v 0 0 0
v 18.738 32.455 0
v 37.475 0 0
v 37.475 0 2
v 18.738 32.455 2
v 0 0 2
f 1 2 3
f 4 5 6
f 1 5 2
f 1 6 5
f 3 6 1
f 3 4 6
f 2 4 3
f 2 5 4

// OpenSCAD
motor_diameter = 28;
motor_hole_dx = 16;
motor_hole_dy = 19;
//
propeller = 254;
motor_to_motor = 260;       //210 > bambu_p1s volume, propeller*1.5 = best
center_to_motor = motor_to_motor/1.414;

module arm_toseat(){
    //to motor
    difference(){
        union(){
        hull(){
        translate([-75,0,0])rotate([0, 90, 0])scale([0.8, 1, 1])cylinder(0.001, r=16, center=true,$fn=50);
        translate([-35,0,0])rotate([0, 90, 0])scale([2, 1, 1])cylinder(0.001, r=6, center=true,$fn=50);
        }
        hull(){
        translate([-75, 0, -20/2])cube([0.001, 32, 20],center=true);
        translate([-35, 0, -20/2])cube([0.001, 12, 20],center=true);
        }
        }
        //-upper
        hull(){
        translate([-75,0,0])rotate([0, 90, 0])scale([0.8, 1, 1])cylinder(0.001, r=15, center=true,$fn=50);
        translate([-35,0,0])rotate([0, 90, 0])scale([2, 1, 1])cylinder(0.001, r=5, center=true,$fn=50);
        }
        //-below
        hull(){
        translate([-75, 0, -20/2])cube([0.001, 30, 18],center=true);
        translate([-35, 0, -20/2])cube([0.001, 10, 18],center=true);
        }
        translate([-35-25/2, 0, -40/2])cube([25, 10, 20],center=true);
    }
}
module arm_center(){
    width=60;
    translate([-5,0,0])difference(){
        rotate([0, 90, 0])scale([2, 1, 1])cylinder(width, r=6, center=true,$fn=50);
        rotate([0, 90, 0])scale([2, 1, 1])cylinder(999, r=5, center=true,$fn=50);
        translate([0, 0, -80/2])cube([ 999, 80, 80],center=true);
    }
    difference(){
        translate([-5, 0, -20/2])cube([width, 12, 20],center=true);
        translate([-5, 0, 1-20/2])cube([999, 10, 20],center=true);
        //
        translate([-25+25/2, 0, -40/2])cube([25, 10, 20],center=true);
        //translate([ 25-10/2, 0, -40/2])cube([10, 10, 20],center=true);
    }
}
module arm_tobody(){
    difference(){
        union(){
        hull(){
        translate([ 65,0,0])rotate([0, 90, 0])scale([0.8, 1, 1])cylinder(0.001, r=16, center=true,$fn=50);
        translate([ 25,0,0])rotate([0, 90, 0])scale([2, 1, 1])cylinder(0.001, r=6, center=true,$fn=50);
        }
        hull(){
        translate([ 65, 0, -20/2])cube([0.001, 32, 20],center=true);
        translate([ 25, 0, -20/2])cube([0.001, 12, 20],center=true);
        }
        }

        hull(){
        translate([ 65,0,0])rotate([0, 90, 0])scale([0.8, 1, 1])cylinder(0.001, r=15, center=true,$fn=50);
        translate([ 25,0,0])rotate([0, 90, 0])scale([2, 1, 1])cylinder(0.001, r=5, center=true,$fn=50);
        }

        hull(){
        translate([ 75, 0, -20/2])cube([0.001, 30, 20],center=true);
        translate([ 25, 0, -20/2])cube([0.001, 10, 20],center=true);
        }

        translate([ 25+25/2, 0, -40/2])cube([25, 10, 20],center=true);
    }
}
module wing(){

    difference(){
        union(){
            //motor seat
            translate([0, 0, 5/2])cylinder(5, r=16, center=true,$fn=50);
            //curve
            translate([75, 0, 20])arm_toseat();
            translate([75, 0, 20])arm_center();
            translate([75, 0, 20])arm_tobody();
            //tobody
            //translate([150-10/2, 0, 32/2])rotate([0,90,0])cylinder(10, r=16, center=true,$fn=50);
            //translate([150-10/2, 0, 16/2])cube([10, 32, 16],center=true);
        }

        //motor area
        translate([0,0,5])rotate([0,20,0])translate([-20/2,0,20])cube([20, 99, 40],center=true);

        //-motor seat hole
        translate([0, 0, 3+20/2])cylinder(20, r=motor_diameter/2, center=true,$fn=50);

        //-cable
        translate([0+15, 0, 1+20/2])cylinder(20, r=5, center=true,$fn=50);

        //-screw hole
        translate([0, 0, 0])cylinder(9, r=4.5, center=true,$fn=50);
        translate([0, 0, 0])rotate([0,0,-45]){
        translate([0, 0+motor_hole_dy/2, 0])cylinder(9, r=1.6, center=true,$fn=50);
        translate([0, 0-motor_hole_dy/2, 0])cylinder(9, r=1.6, center=true,$fn=50);
        translate([0+motor_hole_dx/2, 0, 0])cylinder(9, r=1.6, center=true,$fn=50);
        translate([0-motor_hole_dx/2, 0, 0])cylinder(9, r=1.6, center=true,$fn=50);
        //
        translate([0, 0+motor_hole_dy/2, 0.49])cylinder(1, r=3, center=true,$fn=50);
        translate([0, 0-motor_hole_dy/2, 0.49])cylinder(1, r=3, center=true,$fn=50);
        translate([0+motor_hole_dx/2, 0, 0.49])cylinder(1, r=3, center=true,$fn=50);
        translate([0-motor_hole_dx/2, 0, 0.49])cylinder(1, r=3, center=true,$fn=50);
        }

        //-arm
        //translate([150/2, 0, 1.2/2])cube([100, 10, 10],center=true);
        
        //tobody
        //translate([150, 0, 32/2])cube([30, 20, 20],center=true);
        //translate([150-5, 0, 0])cylinder(99, r=1.6, center=true,$fn=50);
        //translate([150-5, 0, 32/2])rotate([90,0,0])cylinder(99, r=1.6, center=true,$fn=50);
    }
}

module body(){
    difference(){
        union(){
        //battery
        translate([0, 0, 40/2])cube([100, 100, 40],center=true);
        //power
        //translate([0, 0,-40/2])cube([motor_to_motor/2,motor_to_motor/2,40],center=true);
        }

        //-battery
        translate([0, 0, 40/2+0.01])cube([ 80, 80, 40],center=true);
        //-power
        translate([0, 0,-40+38/2])cube([ 80, 80,38.01],center=true);
        translate([-40+10/2, 0,0-2/2])cube([ 10, 10, 3],center=true);
        translate([ 40-10/2, 0,0-2/2])cube([ 10, 10, 3],center=true);
    }
    
    //
    difference(){
        translate([-50-10/2, 0, 32/2])cube([ 10, 20, 20],center=true);
        //
        translate([-50-5, 0, 0])cylinder(99, r=1.6, center=true,$fn=50);
        translate([-50-5, 0, 32/2])rotate([90,0,0])cylinder(99, r=1.6, center=true,$fn=50);
    }
}


module outercircle(){
    height=16;
    difference(){
        translate([0,0,height/2])intersection(){
            cube([280,280,height],center=true);
            rotate([0,0,30])cube([280,280,height],center=true);
            rotate([0,0,60])cube([280,280,height],center=true);
        }
        //center
        cylinder(99, r=135, center=true,$fn=50);
        //
        translate([0,0,height/2])for(a=[0:30:350]){
            rotate([0,0,a]){
                cube([270+4, 5.8, 5.8],center=true);
                translate([0,-25,0])cube([280-6, 5.6, 5.8],center=true);
                translate([0, 25,0])cube([280-6, 5.6, 5.8],center=true);
            }
            //
            rotate([0,90,a]){
                cylinder(h=999, r=1.6, center=true, $fn=20);
                translate([0,-25,0])cylinder(h=999, r=1.6, center=true, $fn=20);
                translate([0, 25,0])cylinder(h=999, r=1.6, center=true, $fn=20);
            }
        }
        //debug
        translate([-100,0,11])cube([200, 999, 20],center=true);
        translate([100, 90,11])cube([200, 120, 20],center=true);
        translate([100,-90,11])cube([200, 120, 20],center=true);
    }
}


module test()
{
    translate([-25,0,0])difference(){
        union(){
        cube([ 10, 20-0.2, 20-0.2],center=true);
        }
        translate([0, 0, 0])cube([ 99, 16, 16],center=true);
        //
        cylinder(99, r=1.6, center=true,$fn=50);
        //
        rotate([90,0,0])cylinder(99, r=1.6, center=true,$fn=50);
    }
    translate([-15,0,0])difference(){
        cube([ 10, 24, 24],center=true);
        cube([ 10, 10, 99],center=true);
        rotate([0,90,0])cylinder(99, r=8, center=true,$fn=50);
    }
    difference(){
        rotate([0,90,0])cylinder(20, r=10, center=true,$fn=50);
        rotate([0,90,0])cylinder(99, r=8, center=true,$fn=50);
    }
    
    translate([ 15,0,0])difference(){
        cube([ 10, 24, 24],center=true);
        cube([ 10, 10, 99],center=true);
        rotate([0,90,0])cylinder(99, r=8, center=true,$fn=50);
    }
    translate([ 25,0,0])difference(){
        union(){
        cube([ 10, 20-0.2, 20-0.2],center=true);
        }
        translate([0, 0, 0])cube([ 99, 16, 16],center=true);
        //
        cylinder(99, r=1.6, center=true,$fn=50);
        //
        rotate([90,0,0])cylinder(99, r=1.6, center=true,$fn=50);
    }
}

xxx=2;
if(xxx==0){
wing();
//translate([50+20,0,0])body();
outercircle();
}
else if(xxx==1){
//wing();
translate([50,50,0])test();
}
else if(xxx==2){
    length = 140*tan(15)*0.999;
    height = length * sqrt(3)/2;
    points = [
        [0, 0],
        [length, 0],
        [length/2, height]
    ];

    linear_extrude(height = 2) polygon(points);
}
